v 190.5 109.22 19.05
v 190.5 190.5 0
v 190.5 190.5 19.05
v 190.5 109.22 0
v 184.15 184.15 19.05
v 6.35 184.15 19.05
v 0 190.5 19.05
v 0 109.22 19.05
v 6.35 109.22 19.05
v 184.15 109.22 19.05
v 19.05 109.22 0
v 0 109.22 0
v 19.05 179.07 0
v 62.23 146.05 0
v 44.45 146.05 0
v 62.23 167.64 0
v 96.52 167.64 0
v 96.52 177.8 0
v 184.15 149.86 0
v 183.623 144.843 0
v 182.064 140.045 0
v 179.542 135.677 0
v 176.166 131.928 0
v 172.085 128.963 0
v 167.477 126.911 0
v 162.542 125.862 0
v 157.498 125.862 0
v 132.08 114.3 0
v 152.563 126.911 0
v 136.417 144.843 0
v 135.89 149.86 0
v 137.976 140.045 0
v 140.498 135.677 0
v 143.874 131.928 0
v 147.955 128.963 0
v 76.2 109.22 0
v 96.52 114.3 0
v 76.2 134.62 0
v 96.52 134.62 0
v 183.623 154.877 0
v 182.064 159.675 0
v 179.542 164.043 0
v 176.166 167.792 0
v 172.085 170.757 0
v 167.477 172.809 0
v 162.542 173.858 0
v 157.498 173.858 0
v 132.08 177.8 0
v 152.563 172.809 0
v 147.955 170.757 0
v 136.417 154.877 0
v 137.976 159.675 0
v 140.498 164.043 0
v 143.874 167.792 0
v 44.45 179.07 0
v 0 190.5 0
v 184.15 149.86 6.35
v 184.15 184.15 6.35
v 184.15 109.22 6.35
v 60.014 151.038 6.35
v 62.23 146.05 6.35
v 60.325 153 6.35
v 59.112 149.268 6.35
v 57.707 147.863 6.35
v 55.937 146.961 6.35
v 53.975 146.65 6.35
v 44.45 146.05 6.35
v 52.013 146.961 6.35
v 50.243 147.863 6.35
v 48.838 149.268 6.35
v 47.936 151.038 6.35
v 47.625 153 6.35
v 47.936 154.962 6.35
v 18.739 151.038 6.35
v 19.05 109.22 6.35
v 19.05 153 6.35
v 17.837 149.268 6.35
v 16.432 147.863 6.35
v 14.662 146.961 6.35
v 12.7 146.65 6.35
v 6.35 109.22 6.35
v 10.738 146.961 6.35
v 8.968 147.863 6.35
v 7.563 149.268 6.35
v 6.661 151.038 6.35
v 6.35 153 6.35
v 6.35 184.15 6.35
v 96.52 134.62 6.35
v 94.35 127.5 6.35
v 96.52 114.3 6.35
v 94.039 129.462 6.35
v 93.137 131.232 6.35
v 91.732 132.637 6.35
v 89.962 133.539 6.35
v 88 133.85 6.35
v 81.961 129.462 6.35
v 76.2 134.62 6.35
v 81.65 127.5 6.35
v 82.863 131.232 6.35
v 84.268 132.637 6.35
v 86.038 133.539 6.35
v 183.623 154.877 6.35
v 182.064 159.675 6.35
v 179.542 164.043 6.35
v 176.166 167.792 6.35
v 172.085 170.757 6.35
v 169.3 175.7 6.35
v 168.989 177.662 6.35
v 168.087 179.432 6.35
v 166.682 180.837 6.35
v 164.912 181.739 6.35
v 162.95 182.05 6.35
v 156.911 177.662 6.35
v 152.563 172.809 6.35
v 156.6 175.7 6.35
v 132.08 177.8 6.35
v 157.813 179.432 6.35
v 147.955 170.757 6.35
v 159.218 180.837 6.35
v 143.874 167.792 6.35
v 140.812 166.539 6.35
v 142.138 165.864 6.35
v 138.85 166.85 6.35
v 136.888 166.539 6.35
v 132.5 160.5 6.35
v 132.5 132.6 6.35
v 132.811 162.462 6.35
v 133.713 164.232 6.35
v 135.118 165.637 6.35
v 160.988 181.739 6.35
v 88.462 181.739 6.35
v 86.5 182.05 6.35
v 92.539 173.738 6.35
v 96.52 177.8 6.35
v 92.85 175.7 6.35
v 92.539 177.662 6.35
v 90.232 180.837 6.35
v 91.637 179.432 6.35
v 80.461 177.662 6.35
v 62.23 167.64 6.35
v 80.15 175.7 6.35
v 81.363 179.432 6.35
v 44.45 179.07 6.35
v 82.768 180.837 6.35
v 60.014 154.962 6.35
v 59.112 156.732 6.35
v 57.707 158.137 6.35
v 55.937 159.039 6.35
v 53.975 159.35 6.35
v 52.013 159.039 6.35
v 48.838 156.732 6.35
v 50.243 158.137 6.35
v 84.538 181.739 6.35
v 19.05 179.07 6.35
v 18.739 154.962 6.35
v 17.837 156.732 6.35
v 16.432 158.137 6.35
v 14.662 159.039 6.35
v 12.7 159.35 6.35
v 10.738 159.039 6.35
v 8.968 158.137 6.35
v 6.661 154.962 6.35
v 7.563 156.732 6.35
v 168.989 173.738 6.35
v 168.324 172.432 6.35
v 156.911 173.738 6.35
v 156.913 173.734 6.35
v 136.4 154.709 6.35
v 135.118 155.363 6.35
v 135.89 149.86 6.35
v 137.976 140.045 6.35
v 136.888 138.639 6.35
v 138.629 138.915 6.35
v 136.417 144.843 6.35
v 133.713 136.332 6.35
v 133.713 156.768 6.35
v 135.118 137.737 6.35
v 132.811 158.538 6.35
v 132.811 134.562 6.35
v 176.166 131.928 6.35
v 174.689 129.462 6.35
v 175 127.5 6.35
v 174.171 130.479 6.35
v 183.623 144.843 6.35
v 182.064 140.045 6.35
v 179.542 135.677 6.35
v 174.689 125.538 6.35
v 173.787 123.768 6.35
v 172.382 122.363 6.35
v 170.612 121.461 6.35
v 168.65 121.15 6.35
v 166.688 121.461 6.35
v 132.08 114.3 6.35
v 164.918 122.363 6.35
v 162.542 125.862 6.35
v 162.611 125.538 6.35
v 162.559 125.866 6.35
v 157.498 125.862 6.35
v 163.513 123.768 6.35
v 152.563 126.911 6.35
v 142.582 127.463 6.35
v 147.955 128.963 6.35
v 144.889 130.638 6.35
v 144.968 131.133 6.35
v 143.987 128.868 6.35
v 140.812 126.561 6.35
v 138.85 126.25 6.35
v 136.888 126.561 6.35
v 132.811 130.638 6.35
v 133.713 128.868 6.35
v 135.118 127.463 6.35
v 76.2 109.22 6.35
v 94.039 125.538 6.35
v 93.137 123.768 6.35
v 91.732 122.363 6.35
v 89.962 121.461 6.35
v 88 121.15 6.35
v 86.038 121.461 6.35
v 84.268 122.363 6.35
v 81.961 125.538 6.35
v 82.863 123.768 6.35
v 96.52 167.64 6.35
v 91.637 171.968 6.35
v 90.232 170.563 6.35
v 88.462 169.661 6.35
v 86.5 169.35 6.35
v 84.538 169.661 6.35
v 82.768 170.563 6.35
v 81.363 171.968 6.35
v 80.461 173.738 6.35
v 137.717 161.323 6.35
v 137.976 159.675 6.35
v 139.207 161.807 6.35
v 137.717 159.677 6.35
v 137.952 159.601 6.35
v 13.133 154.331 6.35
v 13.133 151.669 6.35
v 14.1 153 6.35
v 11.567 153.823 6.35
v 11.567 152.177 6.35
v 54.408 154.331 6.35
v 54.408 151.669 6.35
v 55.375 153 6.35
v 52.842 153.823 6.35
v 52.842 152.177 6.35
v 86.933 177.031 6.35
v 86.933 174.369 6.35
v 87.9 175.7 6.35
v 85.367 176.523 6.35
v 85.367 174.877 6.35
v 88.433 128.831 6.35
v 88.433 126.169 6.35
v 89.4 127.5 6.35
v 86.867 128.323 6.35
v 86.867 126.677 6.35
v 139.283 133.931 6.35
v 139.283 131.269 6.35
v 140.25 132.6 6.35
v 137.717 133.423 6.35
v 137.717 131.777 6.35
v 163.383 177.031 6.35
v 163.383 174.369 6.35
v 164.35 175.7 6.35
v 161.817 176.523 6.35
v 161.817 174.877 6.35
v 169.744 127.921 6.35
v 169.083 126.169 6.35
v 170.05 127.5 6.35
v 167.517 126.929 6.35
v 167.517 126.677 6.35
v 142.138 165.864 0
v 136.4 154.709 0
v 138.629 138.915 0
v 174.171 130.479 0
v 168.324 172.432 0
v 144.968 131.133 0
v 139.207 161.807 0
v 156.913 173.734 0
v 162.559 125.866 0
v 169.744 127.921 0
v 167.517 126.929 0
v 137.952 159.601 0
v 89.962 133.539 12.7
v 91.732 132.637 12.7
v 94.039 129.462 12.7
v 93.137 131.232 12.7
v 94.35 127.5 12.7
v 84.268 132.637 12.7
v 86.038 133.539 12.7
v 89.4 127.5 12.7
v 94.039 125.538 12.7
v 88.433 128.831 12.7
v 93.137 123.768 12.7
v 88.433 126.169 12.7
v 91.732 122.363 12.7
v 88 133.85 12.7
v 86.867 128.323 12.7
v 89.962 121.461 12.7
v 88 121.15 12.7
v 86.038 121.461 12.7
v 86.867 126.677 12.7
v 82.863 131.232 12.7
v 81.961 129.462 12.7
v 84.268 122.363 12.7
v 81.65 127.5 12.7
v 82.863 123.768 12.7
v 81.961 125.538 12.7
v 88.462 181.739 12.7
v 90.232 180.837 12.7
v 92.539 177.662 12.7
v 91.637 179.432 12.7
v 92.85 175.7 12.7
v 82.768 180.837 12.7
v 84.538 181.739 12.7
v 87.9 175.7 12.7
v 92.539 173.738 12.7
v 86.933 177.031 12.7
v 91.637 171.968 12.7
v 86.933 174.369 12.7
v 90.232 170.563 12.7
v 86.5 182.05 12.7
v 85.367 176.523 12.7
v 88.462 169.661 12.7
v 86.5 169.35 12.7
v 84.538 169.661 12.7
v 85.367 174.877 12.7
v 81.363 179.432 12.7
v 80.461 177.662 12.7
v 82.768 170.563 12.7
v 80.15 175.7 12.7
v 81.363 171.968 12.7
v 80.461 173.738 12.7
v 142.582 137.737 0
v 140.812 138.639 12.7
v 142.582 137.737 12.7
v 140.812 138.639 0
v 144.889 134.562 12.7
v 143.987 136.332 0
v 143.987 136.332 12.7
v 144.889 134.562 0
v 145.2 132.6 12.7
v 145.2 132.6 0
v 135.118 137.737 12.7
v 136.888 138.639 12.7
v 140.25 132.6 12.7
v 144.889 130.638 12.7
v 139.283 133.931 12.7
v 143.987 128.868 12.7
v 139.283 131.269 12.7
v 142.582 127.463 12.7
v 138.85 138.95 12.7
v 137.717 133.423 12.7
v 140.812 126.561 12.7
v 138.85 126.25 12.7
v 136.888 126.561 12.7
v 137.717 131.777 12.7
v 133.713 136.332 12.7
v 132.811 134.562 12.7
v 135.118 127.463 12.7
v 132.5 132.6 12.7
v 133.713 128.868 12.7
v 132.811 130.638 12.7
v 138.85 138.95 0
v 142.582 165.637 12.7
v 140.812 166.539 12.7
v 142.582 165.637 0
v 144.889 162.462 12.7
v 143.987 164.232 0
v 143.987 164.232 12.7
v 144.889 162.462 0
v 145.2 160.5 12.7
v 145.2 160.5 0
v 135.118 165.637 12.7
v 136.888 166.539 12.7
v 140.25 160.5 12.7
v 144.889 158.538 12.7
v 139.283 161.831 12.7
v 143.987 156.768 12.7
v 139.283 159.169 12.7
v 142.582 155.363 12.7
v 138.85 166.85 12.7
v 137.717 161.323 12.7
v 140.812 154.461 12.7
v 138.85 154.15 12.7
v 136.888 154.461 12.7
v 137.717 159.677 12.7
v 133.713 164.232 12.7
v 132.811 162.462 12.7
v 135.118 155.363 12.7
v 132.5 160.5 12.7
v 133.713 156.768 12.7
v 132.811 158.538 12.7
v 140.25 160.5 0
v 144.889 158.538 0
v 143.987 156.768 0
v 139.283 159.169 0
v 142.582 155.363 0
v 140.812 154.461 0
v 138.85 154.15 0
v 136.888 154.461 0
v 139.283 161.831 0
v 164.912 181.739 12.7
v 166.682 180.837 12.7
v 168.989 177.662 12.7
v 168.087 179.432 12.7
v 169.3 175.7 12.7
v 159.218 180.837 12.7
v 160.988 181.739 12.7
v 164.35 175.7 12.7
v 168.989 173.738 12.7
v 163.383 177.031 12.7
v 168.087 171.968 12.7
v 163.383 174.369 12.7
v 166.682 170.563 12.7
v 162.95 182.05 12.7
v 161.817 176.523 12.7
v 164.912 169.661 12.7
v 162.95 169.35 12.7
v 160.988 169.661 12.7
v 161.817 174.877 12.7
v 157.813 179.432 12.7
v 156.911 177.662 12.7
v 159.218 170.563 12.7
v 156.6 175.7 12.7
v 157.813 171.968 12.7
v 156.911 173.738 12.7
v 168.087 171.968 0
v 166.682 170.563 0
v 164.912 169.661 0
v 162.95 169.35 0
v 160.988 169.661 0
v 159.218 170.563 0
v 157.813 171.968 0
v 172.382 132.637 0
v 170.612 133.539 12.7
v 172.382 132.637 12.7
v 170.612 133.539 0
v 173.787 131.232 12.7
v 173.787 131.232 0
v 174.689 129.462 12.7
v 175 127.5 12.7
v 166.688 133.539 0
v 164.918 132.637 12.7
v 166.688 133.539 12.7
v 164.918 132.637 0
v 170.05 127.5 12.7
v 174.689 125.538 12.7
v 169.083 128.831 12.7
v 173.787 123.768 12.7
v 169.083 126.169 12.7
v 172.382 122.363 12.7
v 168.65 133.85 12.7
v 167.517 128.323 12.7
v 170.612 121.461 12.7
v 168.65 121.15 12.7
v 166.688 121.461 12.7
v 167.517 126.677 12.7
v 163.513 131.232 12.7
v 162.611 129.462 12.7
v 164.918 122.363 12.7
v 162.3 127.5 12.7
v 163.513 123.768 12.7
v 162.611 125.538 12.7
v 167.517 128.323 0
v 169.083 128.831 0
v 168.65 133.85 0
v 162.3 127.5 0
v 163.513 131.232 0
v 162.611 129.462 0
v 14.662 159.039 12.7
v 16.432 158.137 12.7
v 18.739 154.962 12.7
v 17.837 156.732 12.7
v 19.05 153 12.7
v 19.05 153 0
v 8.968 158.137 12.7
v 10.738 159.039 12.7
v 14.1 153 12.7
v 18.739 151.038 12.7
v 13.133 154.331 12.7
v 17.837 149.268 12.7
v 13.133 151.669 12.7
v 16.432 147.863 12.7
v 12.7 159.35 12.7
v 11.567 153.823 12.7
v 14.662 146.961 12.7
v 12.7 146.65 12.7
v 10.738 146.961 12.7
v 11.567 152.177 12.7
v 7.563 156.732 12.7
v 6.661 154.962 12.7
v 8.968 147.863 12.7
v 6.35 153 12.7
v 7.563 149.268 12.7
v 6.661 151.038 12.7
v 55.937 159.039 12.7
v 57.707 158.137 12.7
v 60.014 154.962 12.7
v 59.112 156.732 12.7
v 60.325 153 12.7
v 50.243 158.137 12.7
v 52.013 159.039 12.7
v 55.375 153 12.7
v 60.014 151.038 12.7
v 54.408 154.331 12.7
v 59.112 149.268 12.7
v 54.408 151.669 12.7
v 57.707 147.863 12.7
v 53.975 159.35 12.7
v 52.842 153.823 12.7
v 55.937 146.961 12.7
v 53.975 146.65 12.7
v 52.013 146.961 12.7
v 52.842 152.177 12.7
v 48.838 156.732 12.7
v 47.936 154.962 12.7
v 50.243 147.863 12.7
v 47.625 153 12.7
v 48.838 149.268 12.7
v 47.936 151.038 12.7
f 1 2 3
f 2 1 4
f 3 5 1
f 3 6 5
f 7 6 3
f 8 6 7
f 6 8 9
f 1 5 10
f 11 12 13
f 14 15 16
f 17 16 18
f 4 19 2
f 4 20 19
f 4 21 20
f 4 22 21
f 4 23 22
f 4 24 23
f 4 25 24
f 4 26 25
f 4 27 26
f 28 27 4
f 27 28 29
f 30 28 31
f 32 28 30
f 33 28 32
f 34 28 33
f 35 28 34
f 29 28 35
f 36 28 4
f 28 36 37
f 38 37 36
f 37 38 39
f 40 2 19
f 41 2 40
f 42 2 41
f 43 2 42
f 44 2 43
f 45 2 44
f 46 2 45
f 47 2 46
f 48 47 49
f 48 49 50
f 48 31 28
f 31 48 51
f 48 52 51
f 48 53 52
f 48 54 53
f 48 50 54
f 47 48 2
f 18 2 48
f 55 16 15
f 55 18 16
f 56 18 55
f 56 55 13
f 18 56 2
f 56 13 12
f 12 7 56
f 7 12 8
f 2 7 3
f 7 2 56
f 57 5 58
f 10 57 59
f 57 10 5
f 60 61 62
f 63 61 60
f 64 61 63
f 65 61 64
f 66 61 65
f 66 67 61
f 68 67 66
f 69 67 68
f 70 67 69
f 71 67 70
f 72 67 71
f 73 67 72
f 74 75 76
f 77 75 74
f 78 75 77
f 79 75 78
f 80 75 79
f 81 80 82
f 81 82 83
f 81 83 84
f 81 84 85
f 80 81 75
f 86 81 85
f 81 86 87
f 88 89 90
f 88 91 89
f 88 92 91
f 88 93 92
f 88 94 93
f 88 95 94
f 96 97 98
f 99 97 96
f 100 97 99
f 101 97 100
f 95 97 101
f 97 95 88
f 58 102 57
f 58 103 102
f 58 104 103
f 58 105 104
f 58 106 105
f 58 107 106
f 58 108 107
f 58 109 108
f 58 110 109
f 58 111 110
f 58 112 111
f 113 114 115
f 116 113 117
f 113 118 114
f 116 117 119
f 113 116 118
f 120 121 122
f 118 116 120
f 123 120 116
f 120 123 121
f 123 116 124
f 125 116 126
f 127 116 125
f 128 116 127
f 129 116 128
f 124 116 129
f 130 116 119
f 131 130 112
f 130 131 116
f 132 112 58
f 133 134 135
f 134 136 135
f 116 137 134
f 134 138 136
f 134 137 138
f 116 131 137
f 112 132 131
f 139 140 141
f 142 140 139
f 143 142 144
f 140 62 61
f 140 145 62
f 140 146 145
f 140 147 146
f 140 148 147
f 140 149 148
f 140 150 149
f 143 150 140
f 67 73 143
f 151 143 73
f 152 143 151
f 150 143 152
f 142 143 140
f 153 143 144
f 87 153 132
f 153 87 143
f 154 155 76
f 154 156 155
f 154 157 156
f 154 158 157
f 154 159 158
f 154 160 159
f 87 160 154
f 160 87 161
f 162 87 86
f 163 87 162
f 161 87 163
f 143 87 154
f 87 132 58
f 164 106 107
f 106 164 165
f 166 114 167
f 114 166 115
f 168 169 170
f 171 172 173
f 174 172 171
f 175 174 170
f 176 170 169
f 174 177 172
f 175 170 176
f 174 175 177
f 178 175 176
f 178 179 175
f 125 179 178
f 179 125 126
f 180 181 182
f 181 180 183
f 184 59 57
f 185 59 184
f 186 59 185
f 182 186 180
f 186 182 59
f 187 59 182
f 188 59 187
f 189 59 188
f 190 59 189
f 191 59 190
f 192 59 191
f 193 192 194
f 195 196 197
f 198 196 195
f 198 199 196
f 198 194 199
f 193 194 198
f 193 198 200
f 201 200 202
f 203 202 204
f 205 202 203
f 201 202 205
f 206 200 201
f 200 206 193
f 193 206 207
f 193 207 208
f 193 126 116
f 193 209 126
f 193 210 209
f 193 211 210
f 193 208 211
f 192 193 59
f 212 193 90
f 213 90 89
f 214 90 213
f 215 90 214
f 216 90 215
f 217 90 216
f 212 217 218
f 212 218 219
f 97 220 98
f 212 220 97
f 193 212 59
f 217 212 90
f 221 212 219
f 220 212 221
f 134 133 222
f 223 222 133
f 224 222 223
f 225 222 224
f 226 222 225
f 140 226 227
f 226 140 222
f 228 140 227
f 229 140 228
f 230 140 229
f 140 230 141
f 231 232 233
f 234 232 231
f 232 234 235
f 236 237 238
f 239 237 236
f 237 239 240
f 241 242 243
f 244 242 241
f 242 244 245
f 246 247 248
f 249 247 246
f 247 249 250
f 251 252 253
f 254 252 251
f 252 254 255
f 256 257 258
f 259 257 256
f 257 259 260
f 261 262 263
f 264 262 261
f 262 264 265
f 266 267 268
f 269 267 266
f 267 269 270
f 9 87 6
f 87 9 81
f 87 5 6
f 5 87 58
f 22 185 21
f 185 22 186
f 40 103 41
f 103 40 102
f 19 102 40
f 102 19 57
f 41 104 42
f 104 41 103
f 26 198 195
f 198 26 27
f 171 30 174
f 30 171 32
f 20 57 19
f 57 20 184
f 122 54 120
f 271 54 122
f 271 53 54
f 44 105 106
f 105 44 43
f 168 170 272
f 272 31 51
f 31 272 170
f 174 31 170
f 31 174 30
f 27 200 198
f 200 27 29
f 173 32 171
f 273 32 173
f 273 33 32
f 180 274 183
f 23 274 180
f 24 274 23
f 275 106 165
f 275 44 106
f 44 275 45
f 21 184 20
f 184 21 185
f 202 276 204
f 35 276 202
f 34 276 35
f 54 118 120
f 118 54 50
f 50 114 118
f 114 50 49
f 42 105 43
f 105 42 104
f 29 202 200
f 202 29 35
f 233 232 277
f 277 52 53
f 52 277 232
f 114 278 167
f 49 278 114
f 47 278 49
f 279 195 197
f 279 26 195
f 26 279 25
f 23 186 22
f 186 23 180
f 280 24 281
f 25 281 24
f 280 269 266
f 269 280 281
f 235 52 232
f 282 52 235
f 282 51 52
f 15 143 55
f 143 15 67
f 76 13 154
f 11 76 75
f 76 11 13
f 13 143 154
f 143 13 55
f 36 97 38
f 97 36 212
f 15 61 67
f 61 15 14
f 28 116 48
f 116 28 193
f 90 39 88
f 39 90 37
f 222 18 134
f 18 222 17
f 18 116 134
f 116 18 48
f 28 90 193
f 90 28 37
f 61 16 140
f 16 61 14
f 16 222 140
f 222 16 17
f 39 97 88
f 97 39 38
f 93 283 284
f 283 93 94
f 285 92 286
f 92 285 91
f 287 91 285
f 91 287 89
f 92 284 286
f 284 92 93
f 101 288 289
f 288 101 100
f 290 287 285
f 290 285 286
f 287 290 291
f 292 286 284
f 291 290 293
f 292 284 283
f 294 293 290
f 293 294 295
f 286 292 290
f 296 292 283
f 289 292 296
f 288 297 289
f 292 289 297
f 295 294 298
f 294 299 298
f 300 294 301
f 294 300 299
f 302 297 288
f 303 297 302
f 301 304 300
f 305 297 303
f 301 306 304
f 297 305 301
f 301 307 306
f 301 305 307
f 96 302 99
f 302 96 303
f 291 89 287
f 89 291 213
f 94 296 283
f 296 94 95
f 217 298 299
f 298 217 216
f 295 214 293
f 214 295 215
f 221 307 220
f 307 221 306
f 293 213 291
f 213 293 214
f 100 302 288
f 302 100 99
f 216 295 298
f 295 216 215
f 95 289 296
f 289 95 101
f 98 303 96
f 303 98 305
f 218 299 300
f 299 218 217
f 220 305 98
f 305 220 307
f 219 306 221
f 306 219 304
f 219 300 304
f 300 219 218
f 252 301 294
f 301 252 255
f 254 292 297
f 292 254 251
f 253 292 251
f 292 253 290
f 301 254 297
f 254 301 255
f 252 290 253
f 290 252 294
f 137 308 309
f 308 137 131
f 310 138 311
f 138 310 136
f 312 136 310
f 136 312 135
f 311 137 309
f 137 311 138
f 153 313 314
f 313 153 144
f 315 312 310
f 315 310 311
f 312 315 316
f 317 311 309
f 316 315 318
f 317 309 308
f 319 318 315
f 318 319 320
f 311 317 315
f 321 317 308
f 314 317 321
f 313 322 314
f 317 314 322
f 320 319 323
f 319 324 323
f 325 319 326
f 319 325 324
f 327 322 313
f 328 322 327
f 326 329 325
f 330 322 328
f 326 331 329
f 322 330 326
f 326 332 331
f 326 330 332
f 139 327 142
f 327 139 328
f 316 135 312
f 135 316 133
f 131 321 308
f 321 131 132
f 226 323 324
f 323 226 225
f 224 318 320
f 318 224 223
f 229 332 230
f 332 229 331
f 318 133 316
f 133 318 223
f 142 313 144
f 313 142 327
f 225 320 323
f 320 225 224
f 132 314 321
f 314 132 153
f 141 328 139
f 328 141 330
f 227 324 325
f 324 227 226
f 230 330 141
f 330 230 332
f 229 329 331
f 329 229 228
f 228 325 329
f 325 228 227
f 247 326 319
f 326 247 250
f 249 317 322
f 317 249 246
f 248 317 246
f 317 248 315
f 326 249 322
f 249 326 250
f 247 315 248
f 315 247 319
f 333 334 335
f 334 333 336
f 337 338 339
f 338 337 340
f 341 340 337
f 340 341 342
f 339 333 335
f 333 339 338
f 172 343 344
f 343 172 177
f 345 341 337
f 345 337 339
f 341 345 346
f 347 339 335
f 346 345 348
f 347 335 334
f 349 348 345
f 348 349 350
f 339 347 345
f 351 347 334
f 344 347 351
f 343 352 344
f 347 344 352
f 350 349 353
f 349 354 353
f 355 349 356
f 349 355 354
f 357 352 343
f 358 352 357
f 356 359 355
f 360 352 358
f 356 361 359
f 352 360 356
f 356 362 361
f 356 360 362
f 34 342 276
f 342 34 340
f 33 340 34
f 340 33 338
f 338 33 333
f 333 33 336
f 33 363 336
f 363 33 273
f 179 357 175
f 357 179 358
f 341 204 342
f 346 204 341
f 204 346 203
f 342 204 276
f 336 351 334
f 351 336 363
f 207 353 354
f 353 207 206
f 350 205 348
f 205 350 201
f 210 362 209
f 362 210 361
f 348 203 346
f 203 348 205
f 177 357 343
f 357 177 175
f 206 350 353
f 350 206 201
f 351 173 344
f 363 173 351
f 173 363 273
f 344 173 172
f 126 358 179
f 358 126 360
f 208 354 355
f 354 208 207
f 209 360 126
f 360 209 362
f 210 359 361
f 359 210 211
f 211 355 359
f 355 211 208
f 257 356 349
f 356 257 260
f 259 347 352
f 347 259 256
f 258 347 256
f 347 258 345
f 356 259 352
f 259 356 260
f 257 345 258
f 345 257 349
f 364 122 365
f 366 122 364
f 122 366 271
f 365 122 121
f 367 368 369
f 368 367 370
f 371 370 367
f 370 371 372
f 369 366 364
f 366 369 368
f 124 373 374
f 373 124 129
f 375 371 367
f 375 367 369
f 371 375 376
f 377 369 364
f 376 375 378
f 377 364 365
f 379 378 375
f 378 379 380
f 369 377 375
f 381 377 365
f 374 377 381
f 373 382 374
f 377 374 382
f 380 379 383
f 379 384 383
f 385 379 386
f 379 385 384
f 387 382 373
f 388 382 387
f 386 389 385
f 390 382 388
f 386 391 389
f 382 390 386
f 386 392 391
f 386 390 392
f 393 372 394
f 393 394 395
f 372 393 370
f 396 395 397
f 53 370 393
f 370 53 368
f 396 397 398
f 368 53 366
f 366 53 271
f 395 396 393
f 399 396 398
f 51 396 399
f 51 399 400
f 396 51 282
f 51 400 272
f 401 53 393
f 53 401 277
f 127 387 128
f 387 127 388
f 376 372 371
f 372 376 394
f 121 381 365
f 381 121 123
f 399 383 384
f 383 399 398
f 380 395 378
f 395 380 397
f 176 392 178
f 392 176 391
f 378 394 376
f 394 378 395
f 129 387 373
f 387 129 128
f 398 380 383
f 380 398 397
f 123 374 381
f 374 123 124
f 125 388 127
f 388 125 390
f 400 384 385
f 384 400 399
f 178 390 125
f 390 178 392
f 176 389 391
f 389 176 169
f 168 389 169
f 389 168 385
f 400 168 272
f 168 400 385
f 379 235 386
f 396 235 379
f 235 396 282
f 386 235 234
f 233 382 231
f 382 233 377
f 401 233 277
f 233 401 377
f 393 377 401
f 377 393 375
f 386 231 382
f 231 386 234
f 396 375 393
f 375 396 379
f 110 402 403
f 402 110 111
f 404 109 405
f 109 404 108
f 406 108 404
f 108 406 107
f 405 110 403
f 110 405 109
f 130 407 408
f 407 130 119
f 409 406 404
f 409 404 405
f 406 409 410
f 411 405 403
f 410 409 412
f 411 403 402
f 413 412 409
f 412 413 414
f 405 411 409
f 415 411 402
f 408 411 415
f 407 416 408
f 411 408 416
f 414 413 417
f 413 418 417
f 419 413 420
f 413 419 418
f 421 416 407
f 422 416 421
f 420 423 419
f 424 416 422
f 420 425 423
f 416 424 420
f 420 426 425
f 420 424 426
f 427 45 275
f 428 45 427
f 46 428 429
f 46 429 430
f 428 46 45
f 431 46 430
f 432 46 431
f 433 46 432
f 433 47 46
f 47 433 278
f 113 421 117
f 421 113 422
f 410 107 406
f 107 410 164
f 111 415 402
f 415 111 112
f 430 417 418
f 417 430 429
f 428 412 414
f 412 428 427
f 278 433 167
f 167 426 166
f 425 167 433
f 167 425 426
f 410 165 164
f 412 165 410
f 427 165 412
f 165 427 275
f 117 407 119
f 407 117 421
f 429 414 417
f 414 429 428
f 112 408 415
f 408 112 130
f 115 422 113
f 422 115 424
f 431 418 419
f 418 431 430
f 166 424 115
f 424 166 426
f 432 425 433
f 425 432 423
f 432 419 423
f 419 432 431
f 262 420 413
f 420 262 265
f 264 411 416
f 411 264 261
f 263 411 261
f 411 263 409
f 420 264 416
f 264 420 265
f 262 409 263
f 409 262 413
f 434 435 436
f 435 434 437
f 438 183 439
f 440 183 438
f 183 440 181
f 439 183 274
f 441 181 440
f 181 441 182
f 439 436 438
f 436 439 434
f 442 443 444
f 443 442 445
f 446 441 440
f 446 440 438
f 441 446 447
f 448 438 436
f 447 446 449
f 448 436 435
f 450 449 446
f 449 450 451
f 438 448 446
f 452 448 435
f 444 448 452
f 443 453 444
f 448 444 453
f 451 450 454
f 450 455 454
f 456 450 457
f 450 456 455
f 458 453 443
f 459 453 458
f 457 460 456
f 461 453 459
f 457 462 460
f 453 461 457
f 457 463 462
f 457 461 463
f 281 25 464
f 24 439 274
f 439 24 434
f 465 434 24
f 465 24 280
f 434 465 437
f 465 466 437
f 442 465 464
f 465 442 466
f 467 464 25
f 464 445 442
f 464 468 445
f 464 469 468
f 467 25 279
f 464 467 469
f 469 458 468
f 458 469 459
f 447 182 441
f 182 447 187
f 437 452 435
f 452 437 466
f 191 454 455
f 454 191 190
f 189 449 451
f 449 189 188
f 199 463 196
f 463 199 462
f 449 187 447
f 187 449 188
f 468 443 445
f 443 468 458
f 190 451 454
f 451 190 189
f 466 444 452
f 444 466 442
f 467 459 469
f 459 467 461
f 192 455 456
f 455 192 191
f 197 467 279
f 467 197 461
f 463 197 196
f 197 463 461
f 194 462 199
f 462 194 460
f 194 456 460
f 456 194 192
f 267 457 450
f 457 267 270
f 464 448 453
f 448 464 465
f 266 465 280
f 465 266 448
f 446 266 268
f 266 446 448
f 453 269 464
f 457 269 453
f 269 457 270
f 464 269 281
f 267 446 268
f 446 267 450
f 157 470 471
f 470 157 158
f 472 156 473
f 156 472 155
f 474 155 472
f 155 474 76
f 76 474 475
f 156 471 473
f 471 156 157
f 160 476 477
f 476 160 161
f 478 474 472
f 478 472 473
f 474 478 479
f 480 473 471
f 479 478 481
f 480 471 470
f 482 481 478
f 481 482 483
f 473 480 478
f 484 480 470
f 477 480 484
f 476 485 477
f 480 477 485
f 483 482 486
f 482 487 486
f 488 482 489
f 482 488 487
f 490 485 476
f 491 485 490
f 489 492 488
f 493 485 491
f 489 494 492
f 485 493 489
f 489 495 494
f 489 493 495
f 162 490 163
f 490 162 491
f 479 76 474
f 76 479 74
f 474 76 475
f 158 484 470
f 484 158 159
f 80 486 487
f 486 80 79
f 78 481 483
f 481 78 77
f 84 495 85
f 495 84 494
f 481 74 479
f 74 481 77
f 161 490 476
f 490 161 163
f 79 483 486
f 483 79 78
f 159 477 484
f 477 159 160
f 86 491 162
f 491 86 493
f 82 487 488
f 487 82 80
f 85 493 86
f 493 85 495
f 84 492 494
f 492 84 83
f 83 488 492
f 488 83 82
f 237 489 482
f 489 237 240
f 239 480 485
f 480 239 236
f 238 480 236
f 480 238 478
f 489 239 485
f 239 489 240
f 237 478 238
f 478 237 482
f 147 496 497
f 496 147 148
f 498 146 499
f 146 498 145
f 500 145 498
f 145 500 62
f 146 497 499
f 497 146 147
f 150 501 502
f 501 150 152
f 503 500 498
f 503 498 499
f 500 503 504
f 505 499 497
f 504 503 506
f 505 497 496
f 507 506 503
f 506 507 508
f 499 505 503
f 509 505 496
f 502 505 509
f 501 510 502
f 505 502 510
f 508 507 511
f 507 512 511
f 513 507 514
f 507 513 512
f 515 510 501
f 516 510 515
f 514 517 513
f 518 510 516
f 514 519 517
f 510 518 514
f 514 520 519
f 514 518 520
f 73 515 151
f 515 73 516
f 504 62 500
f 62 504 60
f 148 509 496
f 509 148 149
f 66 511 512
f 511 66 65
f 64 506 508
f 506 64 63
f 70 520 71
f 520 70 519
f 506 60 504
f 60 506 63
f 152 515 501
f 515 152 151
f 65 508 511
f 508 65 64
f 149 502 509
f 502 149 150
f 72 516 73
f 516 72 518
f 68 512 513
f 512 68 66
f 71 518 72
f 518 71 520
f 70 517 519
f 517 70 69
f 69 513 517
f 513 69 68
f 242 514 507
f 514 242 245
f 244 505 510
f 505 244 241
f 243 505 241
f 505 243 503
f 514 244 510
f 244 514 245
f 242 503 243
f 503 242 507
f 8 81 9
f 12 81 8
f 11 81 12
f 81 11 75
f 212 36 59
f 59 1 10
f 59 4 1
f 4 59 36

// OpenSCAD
// Dimensions
totalWidth = 190.5; // 7.5"
totalLength = 190.5;
inch = 25.4;
halfInch = inch / 2;
quarterInch = inch / 4; // .25"
floorDepth = quarterInch;
edgeWidth = quarterInch;
bossHeight = quarterInch;
cavityDepth = .5 * inch;
boltRadius = 1.4;
dividerHeight = 56;
dividerDepth = inch;

// Boss
module boss(x, y)
{
    translate ([x, y, floorDepth])
    {
        difference()
        {
            cylinder(h = bossHeight + floorDepth, r = quarterInch, center = true);
            cylinder(h = bossHeight + floorDepth + 1, r = boltRadius, center = true);
        }
    }
}

difference()
{
    union()
    {
        // Box
        difference()
        {
            cube([totalWidth, totalLength, floorDepth + cavityDepth], false);

            // Hollow out
            translate([edgeWidth, edgeWidth, floorDepth])
            {
                cube([
                    totalWidth - (2 * edgeWidth),
                    totalLength - (2 * edgeWidth),
                    cavityDepth + 1], 
                    false);
            }
            
            // PLX holes
            translate([
                totalWidth / 4, 
                dividerHeight / 2 + 5, 
                floorDepth / 2])
            {
                cube([totalWidth / 3, dividerHeight * .75, floorDepth + 1], true);
            }
            
            // Between PLX and bus
            translate([
                totalWidth / 2, 
                inch * 3, 
                floorDepth / 2])
            {
                cube([totalWidth * 0.9, inch, floorDepth + 1], true);
            }
            
            // Right circle
            translate([
                inch * 6.3, 
                inch * 5.9, 
                floorDepth / 2])
            {
                cylinder(h = floorDepth + 1, r = inch * .95, center = true);
            }

            // Left hole
            translate([
                inch * 1.25, 
                inch * 5.55, 
                floorDepth / 2])
            {
                cube([inch, inch * 3, inch * 3], true);
            }

            translate([
                inch * 2.25, 
                inch * 5, 
                floorDepth / 2])
            {
                cube([inch * 1.5, inch * 1.5, inch * 3], true);
            }

            translate([
                inch * 4.5, 
                inch * 5.75, 
                floorDepth / 2])
            {
                cube([inch * 1.4, inch * 2.5, inch * 3], true);
            }

            // Right small circle
            translate([
                inch * 2.75, 
                inch * 5.5, 
                floorDepth / 2])
            {
                //cylinder(h = floorDepth + 1, r = inch * .75, center = true);
            }

            translate([
                inch * 3.8, 
                inch * 5.95, 
                floorDepth / 2])
            {
                cube([inch * 2.7, inch * 1.3, inch * 3], true);
            }

            translate([
                totalWidth * 3 / 4, 
                dividerHeight / 2 + 5, 
                floorDepth / 2])
            {
                cube([totalWidth / 3, dividerHeight * .75, floorDepth + 1], true);
            }

            // Wiring passage
            translate([
                totalWidth - (edgeWidth / 2), 
                totalLength / 2, 
                floorDepth * 1.5 + 1 + cavityDepth / 2])
            {
                cube([edgeWidth + 1, inch, cavityDepth * .85], center = true);
                /*
                rotate(a = -90, v = [0, 1, ])
                linear_extrude(height = inch, center=true, convexity = 1, twist = 0)
                polygon(
                    points =
                    [
                        [-halfInch, -halfInch],
                        [-halfInch, halfInch],
                        [halfInch, 0]
                    ],
                    paths =
                    [
                        [0, 1, 2]
                    ]
                );*/
                
            }    
        }  

        // Arduino
        translate([88 - 14, 125, 0])
        {
            boss (14, 2.5); //  lower left
            boss (12.50,               2.5 + 5.1 + 27.9 + 15.2); // top left
            boss (14.05 + 50.8,        2.5 + 5.1); // lower Uno hole
            boss (14.05 + 50.8,        2.5 + 5.1 + 27.9); // upper Uno hole
            boss (14.05 + 50.8 + 24.1, 2.5 + 5.1 + 27.9 + 15.2); // upper Uno hole
            boss (12.00 + 82.65,       2.5); // lower right
        }

        // Voltage regulator
        translate([2 * quarterInch, 153, 0])
        {
            boss (0, 0); //  left
            boss (41.275, 0); //  right
        }

        // PLX divider
        translate([totalWidth / 2, dividerHeight, floorDepth + dividerDepth / 2])
        {
            cylinder(h = inch + 1, r = quarterInch, center = true);
        }

        translate([totalWidth / 2, dividerHeight / 2, floorDepth + dividerDepth / 2])
        {
            difference()
            {
                cube([halfInch, dividerHeight , dividerDepth + 1], center = true);

                translate([0, halfInch + quarterInch, 0])
                {
                    cylinder(h = dividerHeight + floorDepth + 1, r = boltRadius, center = true);
                }
                
                translate([0, (-halfInch) + quarterInch, 0])
                {
                    cylinder(h = dividerHeight + floorDepth + 1, r = boltRadius, center = true);
                }
            }
        }


        // Wiring anchors
        translate([0, 96, 0])
        {
            boss(inch, 0);
            boss(inch + inch, 0);
            
            translate([0, quarterInch, 0])
            {
                boss(inch + inch + inch, 0);
                boss(inch + inch + inch + inch, 0);
                boss(inch + inch + inch + inch + inch, 0);
                boss(inch + inch + inch + inch + inch + inch, 0);
                boss(inch + inch + inch + inch + inch + inch + inch, 0);
            }
        }
    }
    
    // Remove lower half
    translate([
        totalWidth / 2, 
        0, 
        floorDepth / 2])
    {
        cube([totalWidth + 2, 8.6 * inch, inch * 3], true);
    }
}
